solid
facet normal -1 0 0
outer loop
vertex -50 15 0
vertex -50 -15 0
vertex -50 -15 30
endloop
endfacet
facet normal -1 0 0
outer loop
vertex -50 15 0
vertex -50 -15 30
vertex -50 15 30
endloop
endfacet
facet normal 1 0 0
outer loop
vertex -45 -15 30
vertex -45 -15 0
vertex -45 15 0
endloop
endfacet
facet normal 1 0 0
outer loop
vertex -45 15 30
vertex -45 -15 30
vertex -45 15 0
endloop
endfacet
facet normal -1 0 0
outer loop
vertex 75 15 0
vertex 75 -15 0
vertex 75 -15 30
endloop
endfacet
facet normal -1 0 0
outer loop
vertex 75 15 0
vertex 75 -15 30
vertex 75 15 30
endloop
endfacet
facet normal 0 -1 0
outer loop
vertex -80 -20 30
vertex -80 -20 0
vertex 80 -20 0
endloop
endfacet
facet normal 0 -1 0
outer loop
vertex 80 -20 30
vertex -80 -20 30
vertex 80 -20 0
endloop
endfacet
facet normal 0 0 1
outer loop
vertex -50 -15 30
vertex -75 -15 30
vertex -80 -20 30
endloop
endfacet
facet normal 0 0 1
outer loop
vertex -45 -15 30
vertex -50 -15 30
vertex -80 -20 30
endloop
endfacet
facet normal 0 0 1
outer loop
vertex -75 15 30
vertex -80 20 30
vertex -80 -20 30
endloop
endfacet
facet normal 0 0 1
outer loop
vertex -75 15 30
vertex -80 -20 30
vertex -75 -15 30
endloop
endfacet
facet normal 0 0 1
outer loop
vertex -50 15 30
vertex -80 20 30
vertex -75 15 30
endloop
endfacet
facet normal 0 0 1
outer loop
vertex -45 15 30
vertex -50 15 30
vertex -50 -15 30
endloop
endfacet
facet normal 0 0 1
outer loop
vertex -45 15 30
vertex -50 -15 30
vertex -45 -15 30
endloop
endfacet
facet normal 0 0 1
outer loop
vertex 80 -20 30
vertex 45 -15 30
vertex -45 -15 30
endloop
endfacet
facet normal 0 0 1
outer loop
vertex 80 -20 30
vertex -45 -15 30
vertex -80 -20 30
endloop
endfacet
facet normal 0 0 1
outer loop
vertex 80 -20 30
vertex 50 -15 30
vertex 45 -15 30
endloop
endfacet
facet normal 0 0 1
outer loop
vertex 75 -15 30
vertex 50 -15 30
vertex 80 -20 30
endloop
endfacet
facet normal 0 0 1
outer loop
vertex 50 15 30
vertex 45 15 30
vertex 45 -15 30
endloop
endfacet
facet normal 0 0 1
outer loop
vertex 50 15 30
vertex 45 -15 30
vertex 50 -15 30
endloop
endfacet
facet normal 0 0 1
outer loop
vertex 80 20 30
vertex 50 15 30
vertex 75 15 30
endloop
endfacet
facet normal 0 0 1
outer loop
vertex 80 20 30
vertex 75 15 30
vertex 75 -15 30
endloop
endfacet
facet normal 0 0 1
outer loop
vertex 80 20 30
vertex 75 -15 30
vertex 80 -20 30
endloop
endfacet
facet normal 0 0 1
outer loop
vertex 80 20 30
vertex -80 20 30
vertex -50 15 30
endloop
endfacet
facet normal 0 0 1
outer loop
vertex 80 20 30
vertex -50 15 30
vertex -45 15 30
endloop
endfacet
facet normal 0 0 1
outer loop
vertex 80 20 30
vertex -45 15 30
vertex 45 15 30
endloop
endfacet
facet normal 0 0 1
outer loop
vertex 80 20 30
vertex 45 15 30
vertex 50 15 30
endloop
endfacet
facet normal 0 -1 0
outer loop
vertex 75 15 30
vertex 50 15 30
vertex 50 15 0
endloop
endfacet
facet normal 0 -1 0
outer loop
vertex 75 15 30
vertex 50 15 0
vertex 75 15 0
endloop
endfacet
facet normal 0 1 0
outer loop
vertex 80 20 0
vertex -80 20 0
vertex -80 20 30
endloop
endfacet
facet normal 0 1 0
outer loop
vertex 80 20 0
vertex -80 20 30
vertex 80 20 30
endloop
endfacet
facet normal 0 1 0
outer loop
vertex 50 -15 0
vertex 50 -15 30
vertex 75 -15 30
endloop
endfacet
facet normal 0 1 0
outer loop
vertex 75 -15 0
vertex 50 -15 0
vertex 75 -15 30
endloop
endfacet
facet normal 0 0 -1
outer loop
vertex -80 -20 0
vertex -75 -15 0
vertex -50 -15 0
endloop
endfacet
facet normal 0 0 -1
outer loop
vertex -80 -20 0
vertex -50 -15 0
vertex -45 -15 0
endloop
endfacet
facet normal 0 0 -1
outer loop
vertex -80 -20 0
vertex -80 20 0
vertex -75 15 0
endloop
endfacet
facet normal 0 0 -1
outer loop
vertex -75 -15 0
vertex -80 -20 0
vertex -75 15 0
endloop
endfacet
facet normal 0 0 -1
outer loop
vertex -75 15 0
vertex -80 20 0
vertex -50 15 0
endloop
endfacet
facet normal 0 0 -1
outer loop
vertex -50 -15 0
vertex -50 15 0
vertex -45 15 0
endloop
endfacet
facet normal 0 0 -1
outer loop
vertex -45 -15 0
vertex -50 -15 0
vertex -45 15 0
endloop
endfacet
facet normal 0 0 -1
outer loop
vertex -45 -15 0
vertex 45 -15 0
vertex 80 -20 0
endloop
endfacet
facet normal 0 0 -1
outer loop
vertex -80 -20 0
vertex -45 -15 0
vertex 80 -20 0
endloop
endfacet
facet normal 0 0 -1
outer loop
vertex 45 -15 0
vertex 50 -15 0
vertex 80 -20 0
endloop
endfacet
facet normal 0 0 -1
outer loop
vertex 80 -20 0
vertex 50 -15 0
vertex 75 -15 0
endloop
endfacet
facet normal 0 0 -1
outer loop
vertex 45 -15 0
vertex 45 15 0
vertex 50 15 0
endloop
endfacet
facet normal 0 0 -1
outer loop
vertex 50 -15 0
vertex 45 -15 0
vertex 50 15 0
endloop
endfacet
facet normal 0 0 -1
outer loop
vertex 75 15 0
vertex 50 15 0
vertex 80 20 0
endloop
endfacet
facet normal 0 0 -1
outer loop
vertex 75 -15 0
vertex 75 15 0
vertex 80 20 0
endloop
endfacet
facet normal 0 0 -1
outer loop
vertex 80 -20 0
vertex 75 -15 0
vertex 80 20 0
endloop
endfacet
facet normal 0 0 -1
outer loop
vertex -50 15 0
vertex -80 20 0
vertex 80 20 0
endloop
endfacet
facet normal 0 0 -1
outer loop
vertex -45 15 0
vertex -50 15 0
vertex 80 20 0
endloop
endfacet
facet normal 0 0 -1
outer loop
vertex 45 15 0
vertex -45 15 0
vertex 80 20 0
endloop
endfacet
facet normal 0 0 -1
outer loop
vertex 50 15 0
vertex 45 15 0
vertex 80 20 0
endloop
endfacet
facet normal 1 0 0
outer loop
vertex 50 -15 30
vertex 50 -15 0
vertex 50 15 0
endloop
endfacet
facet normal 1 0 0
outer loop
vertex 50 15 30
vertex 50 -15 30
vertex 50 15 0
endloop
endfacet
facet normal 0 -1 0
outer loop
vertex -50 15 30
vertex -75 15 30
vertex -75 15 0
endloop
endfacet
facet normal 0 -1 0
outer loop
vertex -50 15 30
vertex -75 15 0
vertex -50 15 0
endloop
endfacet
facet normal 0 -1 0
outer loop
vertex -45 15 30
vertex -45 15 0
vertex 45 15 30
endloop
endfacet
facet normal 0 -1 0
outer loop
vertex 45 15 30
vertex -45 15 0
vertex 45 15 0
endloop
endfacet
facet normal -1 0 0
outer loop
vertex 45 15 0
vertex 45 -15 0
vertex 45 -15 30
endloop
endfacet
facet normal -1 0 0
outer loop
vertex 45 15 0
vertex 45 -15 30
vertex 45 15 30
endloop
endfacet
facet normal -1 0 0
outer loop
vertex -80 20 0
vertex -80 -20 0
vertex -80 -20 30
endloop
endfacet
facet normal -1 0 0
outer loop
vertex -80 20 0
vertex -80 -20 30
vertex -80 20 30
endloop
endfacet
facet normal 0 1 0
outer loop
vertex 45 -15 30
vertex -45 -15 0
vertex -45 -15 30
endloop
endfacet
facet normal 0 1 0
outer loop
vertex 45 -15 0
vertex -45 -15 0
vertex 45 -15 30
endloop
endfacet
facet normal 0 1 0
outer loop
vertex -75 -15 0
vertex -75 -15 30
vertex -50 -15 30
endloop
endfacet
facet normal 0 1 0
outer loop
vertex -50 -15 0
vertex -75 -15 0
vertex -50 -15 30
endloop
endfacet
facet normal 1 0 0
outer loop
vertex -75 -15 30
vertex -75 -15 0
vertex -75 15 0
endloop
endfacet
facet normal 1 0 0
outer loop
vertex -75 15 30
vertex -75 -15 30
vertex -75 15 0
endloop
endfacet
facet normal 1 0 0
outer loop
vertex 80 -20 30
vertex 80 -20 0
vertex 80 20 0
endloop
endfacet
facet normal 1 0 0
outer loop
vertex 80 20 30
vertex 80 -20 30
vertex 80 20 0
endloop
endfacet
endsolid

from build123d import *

# Parameters (mm, degrees)
SKETCH_8_W      = 160
SKETCH_8_H      = 40
SKETCH_8_W_2    = 25
SKETCH_8_H_2    = 30
SKETCH_8_W_3    = 90
EXTRUDE_5_DEPTH = 30


with BuildPart() as part:
    # 草图8 → 凸台-拉伸5 (new body)
    with BuildSketch(Plane.XY):
        Rectangle(SKETCH_8_W, SKETCH_8_H)
        with Locations((-62.5, 0)):
            Rectangle(SKETCH_8_W_2, SKETCH_8_H_2, mode=Mode.SUBTRACT)
        with Locations((62.5, 0)):
            Rectangle(SKETCH_8_W_2, SKETCH_8_H_2, mode=Mode.SUBTRACT)
        Rectangle(SKETCH_8_W_3, SKETCH_8_H_2, mode=Mode.SUBTRACT)
    extrude(amount=EXTRUDE_5_DEPTH)


solid = part.part
